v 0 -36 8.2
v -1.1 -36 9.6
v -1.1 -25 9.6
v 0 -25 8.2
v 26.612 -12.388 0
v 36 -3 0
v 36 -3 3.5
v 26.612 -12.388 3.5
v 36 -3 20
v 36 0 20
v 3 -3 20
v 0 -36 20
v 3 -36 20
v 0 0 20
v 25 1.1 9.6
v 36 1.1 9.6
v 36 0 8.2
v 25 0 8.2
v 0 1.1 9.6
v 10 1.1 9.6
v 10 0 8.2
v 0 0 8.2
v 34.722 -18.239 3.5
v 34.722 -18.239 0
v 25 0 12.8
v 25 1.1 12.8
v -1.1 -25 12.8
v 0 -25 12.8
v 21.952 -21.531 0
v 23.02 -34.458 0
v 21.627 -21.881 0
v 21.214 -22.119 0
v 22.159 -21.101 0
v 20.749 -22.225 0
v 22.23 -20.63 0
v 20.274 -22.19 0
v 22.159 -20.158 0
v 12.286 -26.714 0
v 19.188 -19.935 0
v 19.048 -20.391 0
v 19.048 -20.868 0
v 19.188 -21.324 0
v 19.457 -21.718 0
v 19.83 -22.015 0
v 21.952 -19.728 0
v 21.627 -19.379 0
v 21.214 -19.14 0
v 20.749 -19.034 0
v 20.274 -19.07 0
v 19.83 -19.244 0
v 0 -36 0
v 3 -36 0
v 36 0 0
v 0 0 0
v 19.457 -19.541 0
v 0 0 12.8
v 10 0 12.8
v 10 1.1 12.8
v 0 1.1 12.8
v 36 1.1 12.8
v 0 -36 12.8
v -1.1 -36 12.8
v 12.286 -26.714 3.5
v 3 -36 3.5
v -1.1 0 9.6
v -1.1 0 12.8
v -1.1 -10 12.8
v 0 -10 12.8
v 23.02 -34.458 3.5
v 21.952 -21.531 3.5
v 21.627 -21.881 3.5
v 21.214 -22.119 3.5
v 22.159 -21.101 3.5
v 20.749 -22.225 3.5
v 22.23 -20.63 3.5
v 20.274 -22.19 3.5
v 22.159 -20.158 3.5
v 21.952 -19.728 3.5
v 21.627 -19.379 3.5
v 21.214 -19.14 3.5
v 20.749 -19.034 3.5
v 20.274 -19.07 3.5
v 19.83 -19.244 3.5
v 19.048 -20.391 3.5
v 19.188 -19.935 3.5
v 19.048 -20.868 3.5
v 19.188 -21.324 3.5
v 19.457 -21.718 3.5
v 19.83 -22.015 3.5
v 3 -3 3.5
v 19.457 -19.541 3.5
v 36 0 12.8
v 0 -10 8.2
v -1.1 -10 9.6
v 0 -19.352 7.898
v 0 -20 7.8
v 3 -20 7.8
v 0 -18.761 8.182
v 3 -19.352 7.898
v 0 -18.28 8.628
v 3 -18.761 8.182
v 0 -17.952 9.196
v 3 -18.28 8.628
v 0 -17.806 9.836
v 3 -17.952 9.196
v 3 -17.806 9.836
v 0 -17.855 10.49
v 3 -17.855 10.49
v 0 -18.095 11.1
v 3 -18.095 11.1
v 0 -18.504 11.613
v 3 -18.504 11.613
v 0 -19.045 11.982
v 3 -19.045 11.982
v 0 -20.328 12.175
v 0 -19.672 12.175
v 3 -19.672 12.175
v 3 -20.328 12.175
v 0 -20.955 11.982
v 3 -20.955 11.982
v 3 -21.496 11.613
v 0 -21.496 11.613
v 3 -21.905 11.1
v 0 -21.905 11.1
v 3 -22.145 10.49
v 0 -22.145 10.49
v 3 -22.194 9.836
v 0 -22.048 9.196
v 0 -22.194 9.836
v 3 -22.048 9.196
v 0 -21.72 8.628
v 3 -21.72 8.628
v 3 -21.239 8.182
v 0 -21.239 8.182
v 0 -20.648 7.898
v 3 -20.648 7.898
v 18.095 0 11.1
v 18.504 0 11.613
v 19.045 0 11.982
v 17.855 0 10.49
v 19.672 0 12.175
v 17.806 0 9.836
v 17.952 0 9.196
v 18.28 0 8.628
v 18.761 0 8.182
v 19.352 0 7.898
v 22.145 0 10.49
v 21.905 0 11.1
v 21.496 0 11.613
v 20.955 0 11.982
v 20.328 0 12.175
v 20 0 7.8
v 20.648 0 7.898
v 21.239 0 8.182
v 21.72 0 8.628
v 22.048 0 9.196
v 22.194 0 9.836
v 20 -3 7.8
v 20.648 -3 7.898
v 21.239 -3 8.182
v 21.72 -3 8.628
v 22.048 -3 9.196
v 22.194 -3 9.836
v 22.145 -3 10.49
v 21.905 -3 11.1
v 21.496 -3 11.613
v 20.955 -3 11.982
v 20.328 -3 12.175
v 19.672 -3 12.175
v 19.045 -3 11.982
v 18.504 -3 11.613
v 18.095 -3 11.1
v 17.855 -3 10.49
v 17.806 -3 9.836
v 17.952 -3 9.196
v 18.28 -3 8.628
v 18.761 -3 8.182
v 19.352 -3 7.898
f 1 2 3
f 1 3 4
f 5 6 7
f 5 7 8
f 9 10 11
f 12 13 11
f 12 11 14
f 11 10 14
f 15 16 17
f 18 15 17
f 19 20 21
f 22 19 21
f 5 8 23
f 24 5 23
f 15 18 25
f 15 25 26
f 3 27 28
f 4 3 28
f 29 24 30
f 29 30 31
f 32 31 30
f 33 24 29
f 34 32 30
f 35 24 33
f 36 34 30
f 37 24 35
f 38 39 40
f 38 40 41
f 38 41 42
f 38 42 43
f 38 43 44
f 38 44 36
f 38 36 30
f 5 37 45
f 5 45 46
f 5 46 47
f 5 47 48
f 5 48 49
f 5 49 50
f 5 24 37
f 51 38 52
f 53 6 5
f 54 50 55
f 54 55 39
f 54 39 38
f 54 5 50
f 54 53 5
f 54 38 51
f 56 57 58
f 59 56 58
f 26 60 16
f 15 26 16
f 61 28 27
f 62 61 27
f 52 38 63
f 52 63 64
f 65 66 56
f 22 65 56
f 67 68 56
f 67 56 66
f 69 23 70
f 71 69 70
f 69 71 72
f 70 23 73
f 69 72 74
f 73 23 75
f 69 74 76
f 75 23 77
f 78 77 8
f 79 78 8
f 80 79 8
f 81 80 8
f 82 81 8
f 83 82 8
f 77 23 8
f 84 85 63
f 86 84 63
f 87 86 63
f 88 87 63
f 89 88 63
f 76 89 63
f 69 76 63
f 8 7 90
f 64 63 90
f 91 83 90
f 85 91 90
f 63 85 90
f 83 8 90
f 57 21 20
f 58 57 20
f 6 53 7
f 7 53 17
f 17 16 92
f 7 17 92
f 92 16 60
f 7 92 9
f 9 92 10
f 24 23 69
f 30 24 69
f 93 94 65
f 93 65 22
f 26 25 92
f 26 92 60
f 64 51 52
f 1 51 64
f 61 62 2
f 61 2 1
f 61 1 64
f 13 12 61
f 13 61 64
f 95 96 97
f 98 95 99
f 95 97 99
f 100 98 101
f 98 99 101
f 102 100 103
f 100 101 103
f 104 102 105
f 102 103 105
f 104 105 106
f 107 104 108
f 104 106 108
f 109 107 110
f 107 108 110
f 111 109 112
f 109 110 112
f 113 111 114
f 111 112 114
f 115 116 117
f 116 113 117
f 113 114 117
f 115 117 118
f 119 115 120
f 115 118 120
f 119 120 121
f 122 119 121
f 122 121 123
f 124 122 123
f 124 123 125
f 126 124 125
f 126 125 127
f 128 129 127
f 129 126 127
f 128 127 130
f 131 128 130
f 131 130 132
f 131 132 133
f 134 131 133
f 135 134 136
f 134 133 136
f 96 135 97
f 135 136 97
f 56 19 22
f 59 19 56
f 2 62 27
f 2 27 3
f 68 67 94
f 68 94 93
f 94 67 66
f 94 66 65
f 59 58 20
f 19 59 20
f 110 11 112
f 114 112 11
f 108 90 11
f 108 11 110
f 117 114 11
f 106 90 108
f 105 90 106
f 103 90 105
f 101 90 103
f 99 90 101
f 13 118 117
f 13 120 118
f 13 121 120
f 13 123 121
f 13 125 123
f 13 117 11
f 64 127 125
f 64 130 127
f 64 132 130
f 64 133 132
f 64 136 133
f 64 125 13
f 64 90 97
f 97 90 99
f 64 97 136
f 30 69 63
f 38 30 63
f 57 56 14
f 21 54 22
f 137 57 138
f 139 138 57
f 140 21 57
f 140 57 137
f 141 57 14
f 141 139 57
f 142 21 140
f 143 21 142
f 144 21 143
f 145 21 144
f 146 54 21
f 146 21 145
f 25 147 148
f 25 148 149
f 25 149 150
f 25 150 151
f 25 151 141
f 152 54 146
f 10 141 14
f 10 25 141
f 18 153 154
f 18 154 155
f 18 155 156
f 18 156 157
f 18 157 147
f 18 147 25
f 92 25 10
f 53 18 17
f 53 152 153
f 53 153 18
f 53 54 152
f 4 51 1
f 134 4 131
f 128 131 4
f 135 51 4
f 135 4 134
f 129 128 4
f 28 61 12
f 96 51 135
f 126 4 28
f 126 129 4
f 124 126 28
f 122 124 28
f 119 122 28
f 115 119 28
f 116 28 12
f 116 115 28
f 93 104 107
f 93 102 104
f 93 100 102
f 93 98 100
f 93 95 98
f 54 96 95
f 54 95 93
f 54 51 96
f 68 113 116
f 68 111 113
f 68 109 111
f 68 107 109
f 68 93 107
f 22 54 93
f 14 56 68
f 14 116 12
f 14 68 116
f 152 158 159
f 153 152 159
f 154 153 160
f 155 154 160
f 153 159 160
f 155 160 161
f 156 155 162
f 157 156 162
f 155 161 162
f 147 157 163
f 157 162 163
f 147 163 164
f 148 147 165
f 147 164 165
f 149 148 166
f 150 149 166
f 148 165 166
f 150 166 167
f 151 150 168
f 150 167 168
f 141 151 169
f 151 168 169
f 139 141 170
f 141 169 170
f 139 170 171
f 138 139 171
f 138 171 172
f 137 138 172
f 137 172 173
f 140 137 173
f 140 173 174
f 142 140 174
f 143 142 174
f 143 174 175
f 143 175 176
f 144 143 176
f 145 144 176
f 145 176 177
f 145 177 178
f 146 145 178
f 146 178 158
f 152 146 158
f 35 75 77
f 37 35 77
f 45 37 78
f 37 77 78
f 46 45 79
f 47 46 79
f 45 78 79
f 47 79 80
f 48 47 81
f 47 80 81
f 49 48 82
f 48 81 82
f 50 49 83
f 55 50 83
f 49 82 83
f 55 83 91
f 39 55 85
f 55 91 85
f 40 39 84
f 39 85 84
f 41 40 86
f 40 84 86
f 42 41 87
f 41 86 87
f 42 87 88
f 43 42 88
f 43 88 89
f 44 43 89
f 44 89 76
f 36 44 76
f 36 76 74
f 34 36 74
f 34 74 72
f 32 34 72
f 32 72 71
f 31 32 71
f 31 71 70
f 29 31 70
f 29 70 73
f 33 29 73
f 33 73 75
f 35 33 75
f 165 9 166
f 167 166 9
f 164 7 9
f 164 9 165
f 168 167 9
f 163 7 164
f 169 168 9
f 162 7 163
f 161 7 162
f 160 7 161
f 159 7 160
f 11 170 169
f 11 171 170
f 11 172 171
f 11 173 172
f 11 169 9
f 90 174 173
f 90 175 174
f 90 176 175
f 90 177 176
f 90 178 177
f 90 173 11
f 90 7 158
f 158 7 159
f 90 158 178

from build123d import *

# Parameters (mm, degrees)
BOSS_EXTRUDE1_DEPTH = 3.5
BOSS_EXTRUDE2_DEPTH = 16.5
SKETCH4_R           = 2.2
CUT_EXTRUDE1_DEPTH  = 53.773099208
SKETCH5_R           = 2.2
CUT_EXTRUDE2_DEPTH  = 53.773099208
BOSS_EXTRUDE5_DEPTH = 36
SKETCH7_W           = 15
SKETCH7_H           = 1.1
CUT_EXTRUDE3_DEPTH  = 53.496095093
BOSS_EXTRUDE6_REACH = 57.429
SKETCH9_W           = 1.1
SKETCH9_H           = 15
CUT_EXTRUDE4_DEPTH  = 53.496095093
BOSS_EXTRUDE7_DEPTH = 3.5
SKETCH11_R          = 1.6
CUT_EXTRUDE5_DEPTH  = 54.518688325


with BuildPart() as part:
    # Sketch1 → Boss-Extrude1 (new body)
    with BuildSketch(Plane.XY):
        Polygon((0, -36), (0, 0), (36, 0), (36, -3), (3, -36), align=None)
    extrude(amount=BOSS_EXTRUDE1_DEPTH)

    # Sketch2 → Boss-Extrude2 (add)
    with BuildSketch(Plane.XY.offset(3.5)):
        Polygon((0, -36), (0, 0), (36, 0), (36, -3), (3, -3), (3, -36), align=None)
    extrude(amount=BOSS_EXTRUDE2_DEPTH)

    # Sketch4 → Cut-Extrude1 (cut, through all)
    with BuildSketch(Plane.XZ.offset(3)):
        with Locations(Location((20, 10, 0), (0, 0, 270))):
            Circle(SKETCH4_R)
    extrude(amount=-CUT_EXTRUDE1_DEPTH, mode=Mode.SUBTRACT)

    # Sketch5 → Cut-Extrude2 (cut, through all)
    with BuildSketch(Plane(origin=(3, 0, 0), x_dir=(0, 0, -1), z_dir=(1, 0, 0))):
        with Locations((-10, -20)):
            Circle(SKETCH5_R)
    extrude(amount=-CUT_EXTRUDE2_DEPTH, mode=Mode.SUBTRACT)

    # Sketch6 → Boss-Extrude5 (add, through all)
    with BuildSketch(Plane(origin=(36, 0, 0), x_dir=(0, 0, -1), z_dir=(1, 0, 0))):
        Polygon((-12.8, 0), (-12.8, 1.1), (-9.6, 1.1), (-8.2, 0), align=None)
    extrude(amount=-BOSS_EXTRUDE5_DEPTH)

    # Sketch7 → Cut-Extrude3 (cut, through all)
    with BuildSketch(Plane.XY.offset(12.8)):
        with Locations((17.5, 0.55)):
            Rectangle(SKETCH7_W, SKETCH7_H)
    extrude(amount=-CUT_EXTRUDE3_DEPTH, mode=Mode.SUBTRACT)

    # Boss-Extrude6: up to this face of the body (flat: up to its plane)
    boss_extrude6_end = Plane(part.part.faces().sort_by_distance((0.411825206, 0, 16.4))[0])
    # Sketch8 → Boss-Extrude6 (add, up to the picked face)
    with BuildSketch(Plane.XZ.offset(36), mode=Mode.PRIVATE) as boss_extrude6_sk1:
        Polygon((0, 8.2), (0, 12.8), (-1.1, 12.8), (-1.1, 9.6), align=None)
    boss_extrude6_tool1 = split(extrude(boss_extrude6_sk1.sketch, amount=-BOSS_EXTRUDE6_REACH, mode=Mode.PRIVATE), bisect_by=boss_extrude6_end, keep=Keep.BOTH, mode=Mode.PRIVATE)
    add(boss_extrude6_tool1.solids().sort_by(Axis((-0.517094, -36, 10.82906), (0, 1, 0)))[0])

    # Sketch9 → Cut-Extrude4 (cut, through all)
    with BuildSketch(Plane.XY.offset(12.8)):
        with Locations((-0.55, -17.5)):
            Rectangle(SKETCH9_W, SKETCH9_H)
    extrude(amount=-CUT_EXTRUDE4_DEPTH, mode=Mode.SUBTRACT)

    # Sketch10 → Boss-Extrude7 (add)
    with BuildSketch(Plane.XY.offset(3.5)):
        Polygon((12.286392879, -26.713607121), (26.612382252, -12.387617748), (34.721916423, -18.238724953), (23.019702013, -34.457793296), align=None)
    extrude(amount=-BOSS_EXTRUDE7_DEPTH)

    # Sketch11 → Cut-Extrude5 (cut, through all)
    with BuildSketch(Plane.XY.offset(3.5)):
        with Locations((20.629708117, -20.629708117)):
            Circle(SKETCH11_R)
    extrude(amount=-CUT_EXTRUDE5_DEPTH, mode=Mode.SUBTRACT)


solid = part.part
